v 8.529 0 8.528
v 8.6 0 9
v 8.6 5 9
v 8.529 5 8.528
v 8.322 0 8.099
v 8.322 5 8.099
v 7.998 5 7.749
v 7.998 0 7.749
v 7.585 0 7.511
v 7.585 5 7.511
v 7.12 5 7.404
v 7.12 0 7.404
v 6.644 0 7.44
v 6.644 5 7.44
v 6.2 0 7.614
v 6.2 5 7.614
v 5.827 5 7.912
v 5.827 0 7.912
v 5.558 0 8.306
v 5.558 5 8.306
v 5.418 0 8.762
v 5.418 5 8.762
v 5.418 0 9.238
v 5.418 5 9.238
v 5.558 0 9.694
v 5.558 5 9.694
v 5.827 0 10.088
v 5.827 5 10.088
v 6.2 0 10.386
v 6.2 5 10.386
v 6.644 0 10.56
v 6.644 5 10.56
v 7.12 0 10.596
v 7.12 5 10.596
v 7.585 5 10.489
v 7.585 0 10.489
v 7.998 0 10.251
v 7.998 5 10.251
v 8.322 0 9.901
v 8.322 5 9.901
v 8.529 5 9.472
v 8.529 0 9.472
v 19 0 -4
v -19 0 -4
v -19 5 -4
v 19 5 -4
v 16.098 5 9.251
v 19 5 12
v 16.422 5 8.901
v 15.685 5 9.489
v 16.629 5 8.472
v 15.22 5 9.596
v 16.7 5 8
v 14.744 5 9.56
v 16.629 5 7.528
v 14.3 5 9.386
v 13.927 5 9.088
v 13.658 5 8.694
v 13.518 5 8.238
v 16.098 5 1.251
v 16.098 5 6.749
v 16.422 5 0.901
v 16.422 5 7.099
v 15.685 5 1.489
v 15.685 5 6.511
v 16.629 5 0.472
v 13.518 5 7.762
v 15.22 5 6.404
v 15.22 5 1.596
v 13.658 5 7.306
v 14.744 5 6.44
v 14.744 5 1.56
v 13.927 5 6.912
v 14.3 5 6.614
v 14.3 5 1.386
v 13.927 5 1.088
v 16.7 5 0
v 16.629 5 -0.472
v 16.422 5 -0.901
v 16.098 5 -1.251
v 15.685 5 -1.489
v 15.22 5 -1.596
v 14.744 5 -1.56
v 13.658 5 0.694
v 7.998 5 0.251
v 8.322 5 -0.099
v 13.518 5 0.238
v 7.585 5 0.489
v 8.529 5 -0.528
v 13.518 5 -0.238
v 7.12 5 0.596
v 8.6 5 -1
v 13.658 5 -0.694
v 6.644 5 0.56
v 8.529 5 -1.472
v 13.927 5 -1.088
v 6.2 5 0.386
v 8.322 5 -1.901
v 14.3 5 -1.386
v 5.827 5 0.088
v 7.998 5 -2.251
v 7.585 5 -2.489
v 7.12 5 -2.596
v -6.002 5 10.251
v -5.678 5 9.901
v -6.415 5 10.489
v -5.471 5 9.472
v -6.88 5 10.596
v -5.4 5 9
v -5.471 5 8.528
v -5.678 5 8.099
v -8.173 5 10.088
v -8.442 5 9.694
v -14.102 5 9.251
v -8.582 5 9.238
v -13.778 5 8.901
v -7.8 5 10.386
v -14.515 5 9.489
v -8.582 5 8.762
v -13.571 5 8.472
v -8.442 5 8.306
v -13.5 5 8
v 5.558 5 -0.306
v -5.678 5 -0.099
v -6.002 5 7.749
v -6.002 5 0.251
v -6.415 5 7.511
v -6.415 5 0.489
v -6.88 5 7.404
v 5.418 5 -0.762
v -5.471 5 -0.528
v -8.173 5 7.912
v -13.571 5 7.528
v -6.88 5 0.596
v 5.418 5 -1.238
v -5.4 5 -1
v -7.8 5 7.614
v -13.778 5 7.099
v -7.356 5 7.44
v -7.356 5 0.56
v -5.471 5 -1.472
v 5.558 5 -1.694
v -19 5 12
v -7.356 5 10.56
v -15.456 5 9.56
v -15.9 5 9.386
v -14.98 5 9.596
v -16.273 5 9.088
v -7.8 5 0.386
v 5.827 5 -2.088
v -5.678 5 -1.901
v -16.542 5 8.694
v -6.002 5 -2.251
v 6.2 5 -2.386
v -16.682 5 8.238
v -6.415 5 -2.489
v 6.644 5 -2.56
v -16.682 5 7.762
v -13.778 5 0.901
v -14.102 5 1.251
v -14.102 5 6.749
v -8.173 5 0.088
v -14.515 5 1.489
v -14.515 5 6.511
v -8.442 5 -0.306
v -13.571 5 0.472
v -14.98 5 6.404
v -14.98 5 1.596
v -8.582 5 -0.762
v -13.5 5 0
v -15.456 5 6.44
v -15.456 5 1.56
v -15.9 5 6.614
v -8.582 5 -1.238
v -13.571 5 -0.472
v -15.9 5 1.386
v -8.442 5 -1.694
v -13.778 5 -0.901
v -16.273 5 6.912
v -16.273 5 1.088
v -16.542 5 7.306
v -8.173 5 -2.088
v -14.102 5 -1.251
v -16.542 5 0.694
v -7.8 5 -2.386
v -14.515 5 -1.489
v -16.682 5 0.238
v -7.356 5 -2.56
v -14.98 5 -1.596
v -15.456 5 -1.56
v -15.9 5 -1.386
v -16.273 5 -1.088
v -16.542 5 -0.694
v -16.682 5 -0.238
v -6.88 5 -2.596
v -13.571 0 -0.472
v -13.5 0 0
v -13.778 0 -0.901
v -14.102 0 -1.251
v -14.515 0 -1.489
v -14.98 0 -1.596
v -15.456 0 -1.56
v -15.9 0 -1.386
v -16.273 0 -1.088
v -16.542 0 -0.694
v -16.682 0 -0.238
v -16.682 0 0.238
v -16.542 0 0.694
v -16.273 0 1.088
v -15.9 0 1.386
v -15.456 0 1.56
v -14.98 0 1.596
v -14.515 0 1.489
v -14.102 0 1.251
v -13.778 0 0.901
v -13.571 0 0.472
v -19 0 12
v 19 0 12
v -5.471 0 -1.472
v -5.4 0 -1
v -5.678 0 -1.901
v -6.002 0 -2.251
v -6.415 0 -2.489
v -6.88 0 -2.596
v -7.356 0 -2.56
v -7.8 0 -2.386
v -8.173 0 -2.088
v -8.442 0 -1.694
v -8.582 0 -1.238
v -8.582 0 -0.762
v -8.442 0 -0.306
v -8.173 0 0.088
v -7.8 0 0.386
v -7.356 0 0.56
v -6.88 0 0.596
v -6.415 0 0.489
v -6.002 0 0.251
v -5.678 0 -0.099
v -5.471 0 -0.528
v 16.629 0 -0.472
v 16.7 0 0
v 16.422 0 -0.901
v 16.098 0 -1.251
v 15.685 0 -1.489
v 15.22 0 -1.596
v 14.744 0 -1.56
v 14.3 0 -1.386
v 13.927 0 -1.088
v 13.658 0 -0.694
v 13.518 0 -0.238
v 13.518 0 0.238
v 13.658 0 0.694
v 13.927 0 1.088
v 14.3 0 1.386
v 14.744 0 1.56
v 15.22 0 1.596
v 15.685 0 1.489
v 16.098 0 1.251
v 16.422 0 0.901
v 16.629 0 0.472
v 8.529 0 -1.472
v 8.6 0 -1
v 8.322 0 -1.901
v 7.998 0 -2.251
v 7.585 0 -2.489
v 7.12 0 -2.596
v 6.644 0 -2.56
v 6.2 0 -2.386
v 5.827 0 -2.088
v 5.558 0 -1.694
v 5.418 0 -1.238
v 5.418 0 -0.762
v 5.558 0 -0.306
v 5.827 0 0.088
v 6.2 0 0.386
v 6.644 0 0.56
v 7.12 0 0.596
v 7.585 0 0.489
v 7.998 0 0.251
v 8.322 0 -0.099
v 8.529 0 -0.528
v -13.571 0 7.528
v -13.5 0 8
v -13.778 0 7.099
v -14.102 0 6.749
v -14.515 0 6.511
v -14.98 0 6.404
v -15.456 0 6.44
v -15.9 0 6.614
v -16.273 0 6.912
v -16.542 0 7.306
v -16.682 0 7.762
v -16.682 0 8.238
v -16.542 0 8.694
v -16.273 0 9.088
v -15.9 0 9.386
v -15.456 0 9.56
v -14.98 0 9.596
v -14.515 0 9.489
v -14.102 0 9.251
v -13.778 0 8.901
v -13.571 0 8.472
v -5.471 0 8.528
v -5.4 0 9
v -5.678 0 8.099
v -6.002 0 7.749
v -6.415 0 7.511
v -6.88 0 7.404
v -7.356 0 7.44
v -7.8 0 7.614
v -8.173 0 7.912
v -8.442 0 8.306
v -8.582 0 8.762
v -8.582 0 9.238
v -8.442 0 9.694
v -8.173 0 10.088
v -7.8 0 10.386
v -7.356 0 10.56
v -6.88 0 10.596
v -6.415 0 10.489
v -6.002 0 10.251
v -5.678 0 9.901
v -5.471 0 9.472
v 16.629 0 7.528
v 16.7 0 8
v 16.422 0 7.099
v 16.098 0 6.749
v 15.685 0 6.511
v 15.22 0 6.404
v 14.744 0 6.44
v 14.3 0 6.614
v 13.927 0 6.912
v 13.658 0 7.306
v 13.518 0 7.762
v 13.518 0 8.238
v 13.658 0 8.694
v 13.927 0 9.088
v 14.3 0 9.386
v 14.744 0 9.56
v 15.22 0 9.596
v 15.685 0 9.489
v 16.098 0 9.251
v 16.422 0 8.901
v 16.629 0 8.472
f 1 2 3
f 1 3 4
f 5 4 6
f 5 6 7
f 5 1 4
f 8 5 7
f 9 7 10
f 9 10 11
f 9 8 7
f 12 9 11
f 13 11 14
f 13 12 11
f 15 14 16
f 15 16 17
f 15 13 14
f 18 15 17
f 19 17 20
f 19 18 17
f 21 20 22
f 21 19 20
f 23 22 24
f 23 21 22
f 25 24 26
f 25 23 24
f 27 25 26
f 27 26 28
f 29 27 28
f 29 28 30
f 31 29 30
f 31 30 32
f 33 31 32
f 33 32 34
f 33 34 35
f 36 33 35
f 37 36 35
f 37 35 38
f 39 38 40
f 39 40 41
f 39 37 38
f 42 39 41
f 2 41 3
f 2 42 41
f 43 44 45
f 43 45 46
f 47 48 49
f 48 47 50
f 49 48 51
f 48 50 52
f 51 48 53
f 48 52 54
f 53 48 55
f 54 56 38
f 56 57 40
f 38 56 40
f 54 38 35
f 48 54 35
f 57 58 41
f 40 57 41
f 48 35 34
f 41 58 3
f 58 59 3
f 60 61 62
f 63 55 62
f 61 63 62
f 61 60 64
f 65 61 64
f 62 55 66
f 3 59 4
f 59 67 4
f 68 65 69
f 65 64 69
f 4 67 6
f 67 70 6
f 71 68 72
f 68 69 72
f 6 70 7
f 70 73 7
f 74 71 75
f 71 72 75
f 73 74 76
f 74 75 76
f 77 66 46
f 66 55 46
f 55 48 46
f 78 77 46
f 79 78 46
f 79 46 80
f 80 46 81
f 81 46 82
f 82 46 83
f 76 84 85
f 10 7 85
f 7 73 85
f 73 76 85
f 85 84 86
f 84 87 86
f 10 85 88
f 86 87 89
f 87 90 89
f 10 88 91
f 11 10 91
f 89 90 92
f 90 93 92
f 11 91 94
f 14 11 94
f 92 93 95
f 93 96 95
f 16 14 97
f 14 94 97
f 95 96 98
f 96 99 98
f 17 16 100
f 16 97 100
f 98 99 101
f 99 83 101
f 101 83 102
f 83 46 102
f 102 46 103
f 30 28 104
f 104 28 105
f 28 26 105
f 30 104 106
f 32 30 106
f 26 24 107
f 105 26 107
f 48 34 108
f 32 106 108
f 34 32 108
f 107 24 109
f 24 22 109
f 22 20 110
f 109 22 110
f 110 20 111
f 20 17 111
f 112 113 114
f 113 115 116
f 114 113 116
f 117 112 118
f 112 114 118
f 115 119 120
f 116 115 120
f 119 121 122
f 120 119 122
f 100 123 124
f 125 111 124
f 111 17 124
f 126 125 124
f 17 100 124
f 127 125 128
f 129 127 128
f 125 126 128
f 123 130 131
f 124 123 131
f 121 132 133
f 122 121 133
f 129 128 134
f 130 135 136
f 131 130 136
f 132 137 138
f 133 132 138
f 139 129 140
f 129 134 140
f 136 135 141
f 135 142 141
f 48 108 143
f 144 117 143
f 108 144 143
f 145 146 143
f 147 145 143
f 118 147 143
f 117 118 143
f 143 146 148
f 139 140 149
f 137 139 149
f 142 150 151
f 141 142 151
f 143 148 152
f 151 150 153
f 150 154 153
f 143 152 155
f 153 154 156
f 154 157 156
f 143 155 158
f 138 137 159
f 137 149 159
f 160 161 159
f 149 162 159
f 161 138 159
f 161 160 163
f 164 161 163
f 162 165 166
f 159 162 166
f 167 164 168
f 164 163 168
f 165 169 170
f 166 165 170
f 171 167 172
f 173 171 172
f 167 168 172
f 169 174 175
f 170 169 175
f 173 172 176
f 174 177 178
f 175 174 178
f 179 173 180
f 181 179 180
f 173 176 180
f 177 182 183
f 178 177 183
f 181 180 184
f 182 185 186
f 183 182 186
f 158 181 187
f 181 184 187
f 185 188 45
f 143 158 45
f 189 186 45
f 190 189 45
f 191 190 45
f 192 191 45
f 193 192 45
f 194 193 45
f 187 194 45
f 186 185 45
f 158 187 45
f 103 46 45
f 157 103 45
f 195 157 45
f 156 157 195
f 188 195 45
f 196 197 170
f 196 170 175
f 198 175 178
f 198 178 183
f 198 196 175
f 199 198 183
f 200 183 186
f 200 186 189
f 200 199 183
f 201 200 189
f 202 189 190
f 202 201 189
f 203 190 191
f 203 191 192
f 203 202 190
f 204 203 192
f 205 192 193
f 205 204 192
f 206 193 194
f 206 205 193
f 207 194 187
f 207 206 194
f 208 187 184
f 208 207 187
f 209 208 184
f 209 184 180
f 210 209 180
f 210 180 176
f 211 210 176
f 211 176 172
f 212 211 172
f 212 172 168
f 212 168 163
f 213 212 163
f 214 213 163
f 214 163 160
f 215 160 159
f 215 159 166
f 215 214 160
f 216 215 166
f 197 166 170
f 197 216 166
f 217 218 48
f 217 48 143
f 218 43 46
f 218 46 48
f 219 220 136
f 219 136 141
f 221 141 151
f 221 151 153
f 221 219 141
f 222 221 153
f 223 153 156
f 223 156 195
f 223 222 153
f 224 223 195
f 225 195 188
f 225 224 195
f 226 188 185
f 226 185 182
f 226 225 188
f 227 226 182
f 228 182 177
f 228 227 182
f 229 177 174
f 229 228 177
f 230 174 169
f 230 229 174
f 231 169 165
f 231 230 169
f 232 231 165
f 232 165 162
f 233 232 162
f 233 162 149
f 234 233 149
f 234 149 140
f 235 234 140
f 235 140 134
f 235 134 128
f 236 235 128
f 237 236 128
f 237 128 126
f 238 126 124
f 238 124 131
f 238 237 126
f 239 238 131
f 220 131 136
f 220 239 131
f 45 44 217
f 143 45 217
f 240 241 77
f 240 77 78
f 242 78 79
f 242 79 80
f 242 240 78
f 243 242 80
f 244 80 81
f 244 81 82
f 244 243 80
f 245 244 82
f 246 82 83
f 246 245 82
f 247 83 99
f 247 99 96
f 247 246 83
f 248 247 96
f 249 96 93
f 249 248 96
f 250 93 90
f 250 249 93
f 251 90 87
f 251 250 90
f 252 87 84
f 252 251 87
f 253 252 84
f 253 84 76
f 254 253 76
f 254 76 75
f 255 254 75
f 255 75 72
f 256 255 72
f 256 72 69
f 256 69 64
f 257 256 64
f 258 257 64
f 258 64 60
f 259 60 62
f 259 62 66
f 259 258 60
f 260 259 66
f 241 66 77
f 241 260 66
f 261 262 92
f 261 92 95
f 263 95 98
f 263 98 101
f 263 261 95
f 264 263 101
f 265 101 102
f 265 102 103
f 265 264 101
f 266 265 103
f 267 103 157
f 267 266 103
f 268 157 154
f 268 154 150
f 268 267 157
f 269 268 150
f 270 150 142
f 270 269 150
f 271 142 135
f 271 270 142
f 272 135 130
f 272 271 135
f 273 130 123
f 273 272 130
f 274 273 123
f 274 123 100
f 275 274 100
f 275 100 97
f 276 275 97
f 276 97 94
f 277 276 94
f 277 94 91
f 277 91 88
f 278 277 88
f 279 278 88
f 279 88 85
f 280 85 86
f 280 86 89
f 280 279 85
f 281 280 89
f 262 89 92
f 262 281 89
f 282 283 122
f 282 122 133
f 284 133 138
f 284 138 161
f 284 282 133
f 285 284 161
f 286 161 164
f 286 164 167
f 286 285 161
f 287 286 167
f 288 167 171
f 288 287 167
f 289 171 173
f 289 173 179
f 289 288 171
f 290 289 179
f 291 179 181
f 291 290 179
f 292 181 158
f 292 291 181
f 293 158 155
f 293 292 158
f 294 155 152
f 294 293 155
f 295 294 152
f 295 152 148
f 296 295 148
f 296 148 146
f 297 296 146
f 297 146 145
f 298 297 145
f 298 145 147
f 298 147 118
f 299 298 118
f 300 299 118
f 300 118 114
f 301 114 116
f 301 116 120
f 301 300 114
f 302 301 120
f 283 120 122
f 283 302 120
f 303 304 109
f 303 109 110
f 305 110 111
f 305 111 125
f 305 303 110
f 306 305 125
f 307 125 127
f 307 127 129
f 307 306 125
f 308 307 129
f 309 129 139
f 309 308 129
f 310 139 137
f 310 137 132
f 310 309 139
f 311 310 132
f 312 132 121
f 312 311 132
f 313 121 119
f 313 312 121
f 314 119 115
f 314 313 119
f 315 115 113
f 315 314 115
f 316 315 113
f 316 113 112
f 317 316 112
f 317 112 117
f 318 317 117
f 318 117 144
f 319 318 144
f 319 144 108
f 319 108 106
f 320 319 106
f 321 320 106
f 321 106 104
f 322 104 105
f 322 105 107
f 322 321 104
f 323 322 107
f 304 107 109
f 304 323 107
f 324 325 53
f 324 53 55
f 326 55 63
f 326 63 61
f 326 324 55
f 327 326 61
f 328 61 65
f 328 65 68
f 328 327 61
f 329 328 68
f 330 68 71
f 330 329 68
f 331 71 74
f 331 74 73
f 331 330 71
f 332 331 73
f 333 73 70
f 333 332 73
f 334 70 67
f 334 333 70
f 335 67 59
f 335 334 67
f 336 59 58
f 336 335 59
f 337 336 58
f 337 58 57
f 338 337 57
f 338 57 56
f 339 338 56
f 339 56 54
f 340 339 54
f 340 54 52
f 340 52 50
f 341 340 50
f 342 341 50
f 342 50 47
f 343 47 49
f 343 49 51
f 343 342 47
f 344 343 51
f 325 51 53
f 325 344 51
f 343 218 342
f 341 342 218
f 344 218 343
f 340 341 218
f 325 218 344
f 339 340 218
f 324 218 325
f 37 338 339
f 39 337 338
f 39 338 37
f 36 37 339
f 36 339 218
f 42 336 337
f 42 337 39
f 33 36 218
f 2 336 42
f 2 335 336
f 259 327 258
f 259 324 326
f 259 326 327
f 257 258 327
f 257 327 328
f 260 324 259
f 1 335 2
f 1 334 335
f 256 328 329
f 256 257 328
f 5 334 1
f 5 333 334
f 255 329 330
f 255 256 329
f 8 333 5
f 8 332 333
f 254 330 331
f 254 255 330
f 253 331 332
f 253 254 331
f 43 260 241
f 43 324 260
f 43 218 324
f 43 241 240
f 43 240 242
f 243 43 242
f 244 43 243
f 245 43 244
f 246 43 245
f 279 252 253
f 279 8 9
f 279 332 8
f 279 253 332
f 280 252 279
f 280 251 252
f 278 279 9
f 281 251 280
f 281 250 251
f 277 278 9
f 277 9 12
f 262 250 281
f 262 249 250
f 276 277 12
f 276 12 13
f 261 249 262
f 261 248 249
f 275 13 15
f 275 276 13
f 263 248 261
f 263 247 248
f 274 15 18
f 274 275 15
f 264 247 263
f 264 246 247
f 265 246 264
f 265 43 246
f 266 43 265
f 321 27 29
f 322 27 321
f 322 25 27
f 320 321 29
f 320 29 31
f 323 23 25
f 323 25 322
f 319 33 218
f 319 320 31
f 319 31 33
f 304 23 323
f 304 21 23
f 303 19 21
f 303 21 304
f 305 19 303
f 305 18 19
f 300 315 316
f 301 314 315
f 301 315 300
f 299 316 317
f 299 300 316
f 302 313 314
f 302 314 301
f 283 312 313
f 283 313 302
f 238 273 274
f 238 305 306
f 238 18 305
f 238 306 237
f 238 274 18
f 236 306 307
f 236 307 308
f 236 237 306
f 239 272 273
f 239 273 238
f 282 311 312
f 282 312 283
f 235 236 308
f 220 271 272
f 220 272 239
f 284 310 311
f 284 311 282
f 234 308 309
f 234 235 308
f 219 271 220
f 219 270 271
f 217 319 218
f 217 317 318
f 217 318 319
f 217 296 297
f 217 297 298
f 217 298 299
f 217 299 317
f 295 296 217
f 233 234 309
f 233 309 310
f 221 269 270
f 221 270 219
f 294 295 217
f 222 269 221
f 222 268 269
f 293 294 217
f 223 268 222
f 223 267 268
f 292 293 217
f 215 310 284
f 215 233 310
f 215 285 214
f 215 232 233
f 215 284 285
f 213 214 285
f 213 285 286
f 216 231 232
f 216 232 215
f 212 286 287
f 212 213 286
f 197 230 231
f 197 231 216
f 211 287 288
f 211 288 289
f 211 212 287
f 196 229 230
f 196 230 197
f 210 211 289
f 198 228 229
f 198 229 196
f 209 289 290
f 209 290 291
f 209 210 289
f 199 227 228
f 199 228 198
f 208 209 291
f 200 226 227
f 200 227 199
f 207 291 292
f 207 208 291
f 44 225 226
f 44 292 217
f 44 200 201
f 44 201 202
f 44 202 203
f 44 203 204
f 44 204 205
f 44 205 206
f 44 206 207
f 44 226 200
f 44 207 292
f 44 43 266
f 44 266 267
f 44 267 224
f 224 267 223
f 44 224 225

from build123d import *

# Parameters (mm, degrees)
SKETCH1_R           = 1.6
BOSS_EXTRUDE1_DEPTH = 5


with BuildPart() as part:
    # Sketch1 → Boss-Extrude1 (new body)
    with BuildSketch(Plane(origin=(0, 0, 0), x_dir=(1, 0, 0), z_dir=(0, 1, 0))):
        Polygon((-19, 4), (19, 4), (19, -12), (-19, -12), (-19, -4), align=None)
        with Locations((-7, 1)):
            Circle(SKETCH1_R, mode=Mode.SUBTRACT)
        with Locations((7, 1)):
            Circle(SKETCH1_R, mode=Mode.SUBTRACT)
        with Locations((15.1, 0)):
            Circle(SKETCH1_R, mode=Mode.SUBTRACT)
        with Locations((-15.1, 0)):
            Circle(SKETCH1_R, mode=Mode.SUBTRACT)
        with Locations((-15.1, -8)):
            Circle(SKETCH1_R, mode=Mode.SUBTRACT)
        with Locations((15.1, -8)):
            Circle(SKETCH1_R, mode=Mode.SUBTRACT)
        with Locations((7, -9)):
            Circle(SKETCH1_R, mode=Mode.SUBTRACT)
        with Locations((-7, -9)):
            Circle(SKETCH1_R, mode=Mode.SUBTRACT)
    extrude(amount=BOSS_EXTRUDE1_DEPTH)


solid = part.part
